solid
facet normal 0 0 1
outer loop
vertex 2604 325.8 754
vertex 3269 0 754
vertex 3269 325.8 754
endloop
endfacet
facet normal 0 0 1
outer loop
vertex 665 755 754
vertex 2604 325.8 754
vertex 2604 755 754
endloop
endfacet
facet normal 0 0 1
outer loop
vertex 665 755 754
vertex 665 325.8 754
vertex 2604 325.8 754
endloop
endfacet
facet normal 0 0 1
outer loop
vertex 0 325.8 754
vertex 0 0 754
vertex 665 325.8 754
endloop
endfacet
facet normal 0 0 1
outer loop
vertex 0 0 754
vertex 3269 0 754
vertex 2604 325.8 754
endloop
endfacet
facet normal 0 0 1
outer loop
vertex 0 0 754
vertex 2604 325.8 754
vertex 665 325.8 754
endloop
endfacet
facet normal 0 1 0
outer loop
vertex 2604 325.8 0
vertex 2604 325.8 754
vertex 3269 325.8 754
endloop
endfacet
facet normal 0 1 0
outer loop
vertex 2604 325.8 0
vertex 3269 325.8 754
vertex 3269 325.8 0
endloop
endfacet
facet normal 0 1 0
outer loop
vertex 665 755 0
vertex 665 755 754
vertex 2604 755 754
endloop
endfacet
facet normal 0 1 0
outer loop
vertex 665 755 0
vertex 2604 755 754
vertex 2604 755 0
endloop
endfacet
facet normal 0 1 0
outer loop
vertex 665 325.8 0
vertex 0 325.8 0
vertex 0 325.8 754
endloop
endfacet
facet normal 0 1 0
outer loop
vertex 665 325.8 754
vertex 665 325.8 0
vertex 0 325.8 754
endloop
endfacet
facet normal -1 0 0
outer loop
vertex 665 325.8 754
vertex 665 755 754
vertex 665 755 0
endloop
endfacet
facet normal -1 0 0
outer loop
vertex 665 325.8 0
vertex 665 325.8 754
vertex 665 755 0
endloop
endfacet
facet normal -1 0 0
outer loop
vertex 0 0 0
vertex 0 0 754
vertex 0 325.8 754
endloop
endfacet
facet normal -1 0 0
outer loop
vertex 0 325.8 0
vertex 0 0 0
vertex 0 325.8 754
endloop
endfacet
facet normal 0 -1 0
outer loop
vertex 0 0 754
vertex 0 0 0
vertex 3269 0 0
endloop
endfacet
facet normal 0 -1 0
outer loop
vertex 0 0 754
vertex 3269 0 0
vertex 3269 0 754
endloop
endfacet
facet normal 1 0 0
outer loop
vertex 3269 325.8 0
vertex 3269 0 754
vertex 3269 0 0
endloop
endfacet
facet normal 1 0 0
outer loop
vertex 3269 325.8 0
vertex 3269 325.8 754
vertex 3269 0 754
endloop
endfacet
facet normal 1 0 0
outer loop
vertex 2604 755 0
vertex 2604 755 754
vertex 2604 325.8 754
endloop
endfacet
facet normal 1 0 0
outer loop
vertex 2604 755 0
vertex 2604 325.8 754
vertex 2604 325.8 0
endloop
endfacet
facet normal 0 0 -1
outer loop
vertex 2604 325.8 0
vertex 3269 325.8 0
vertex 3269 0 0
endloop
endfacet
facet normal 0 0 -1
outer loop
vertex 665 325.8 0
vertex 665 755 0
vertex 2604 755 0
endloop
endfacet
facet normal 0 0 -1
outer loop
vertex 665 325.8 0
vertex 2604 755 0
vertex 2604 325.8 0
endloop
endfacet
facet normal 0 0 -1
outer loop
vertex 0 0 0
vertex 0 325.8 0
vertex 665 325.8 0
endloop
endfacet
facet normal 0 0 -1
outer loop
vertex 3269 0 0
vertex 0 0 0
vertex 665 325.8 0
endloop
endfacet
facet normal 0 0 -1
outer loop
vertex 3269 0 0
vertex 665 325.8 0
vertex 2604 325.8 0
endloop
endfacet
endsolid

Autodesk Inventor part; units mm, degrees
ref_plane "YZ Plane" through (0, 0, 0) normal (1, 0, 0) x (0, 1, 0)
ref_plane "XZ Plane" through (0, 0, 0) normal (0, 1, 0) x (-1, 0, 0)
ref_plane "XY Plane" through (0, 0, 0) normal (0, 0, 1) x (1, 0, 0)
sketch "スケッチ1" plane through (0, 0, 0) normal (1, 0, 0) x (0, 1, 0)
  line L0 (0, 0) -> (325.8, 0)
  line L1 (325.8, 0) -> (325.8, 754)
  line L2 (325.8, 754) -> (0, 754)
  line L3 (0, 754) -> (0, 0)
  dimension "d0" = 325.8
  dimension "d1" = 754
extrude "押し出し1" add sketch "スケッチ1" along normal blind 665
sketch "スケッチ2" plane through (665, 0, 0) normal (1, 0, 0) x (0, 0, -1)
  line L0 (0, 0) -> (-754, 0)
  line L1 (-754, 0) -> (-754, 755)
  line L2 (-754, 755) -> (0, 755)
  line L3 (0, 755) -> (0, 0)
  dimension "d4" = 754
  dimension "d5" = 755
extrude "押し出し2" add sketch "スケッチ2" along normal blind 1939
sketch "スケッチ3" plane through (2604, 0, 0) normal (1, 0, 0) x (0, 0, -1)
  line L0 (0, 0) -> (-754, 0)
  line L1 (-754, 0) -> (-754, 325.8)
  line L2 (-754, 325.8) -> (0, 325.8)
  line L3 (0, 325.8) -> (0, 0)
  dimension "d8" = 754
  dimension "d9" = 325.8
extrude "押し出し3" add sketch "スケッチ3" along normal blind 665
properties part number "cabinet"
